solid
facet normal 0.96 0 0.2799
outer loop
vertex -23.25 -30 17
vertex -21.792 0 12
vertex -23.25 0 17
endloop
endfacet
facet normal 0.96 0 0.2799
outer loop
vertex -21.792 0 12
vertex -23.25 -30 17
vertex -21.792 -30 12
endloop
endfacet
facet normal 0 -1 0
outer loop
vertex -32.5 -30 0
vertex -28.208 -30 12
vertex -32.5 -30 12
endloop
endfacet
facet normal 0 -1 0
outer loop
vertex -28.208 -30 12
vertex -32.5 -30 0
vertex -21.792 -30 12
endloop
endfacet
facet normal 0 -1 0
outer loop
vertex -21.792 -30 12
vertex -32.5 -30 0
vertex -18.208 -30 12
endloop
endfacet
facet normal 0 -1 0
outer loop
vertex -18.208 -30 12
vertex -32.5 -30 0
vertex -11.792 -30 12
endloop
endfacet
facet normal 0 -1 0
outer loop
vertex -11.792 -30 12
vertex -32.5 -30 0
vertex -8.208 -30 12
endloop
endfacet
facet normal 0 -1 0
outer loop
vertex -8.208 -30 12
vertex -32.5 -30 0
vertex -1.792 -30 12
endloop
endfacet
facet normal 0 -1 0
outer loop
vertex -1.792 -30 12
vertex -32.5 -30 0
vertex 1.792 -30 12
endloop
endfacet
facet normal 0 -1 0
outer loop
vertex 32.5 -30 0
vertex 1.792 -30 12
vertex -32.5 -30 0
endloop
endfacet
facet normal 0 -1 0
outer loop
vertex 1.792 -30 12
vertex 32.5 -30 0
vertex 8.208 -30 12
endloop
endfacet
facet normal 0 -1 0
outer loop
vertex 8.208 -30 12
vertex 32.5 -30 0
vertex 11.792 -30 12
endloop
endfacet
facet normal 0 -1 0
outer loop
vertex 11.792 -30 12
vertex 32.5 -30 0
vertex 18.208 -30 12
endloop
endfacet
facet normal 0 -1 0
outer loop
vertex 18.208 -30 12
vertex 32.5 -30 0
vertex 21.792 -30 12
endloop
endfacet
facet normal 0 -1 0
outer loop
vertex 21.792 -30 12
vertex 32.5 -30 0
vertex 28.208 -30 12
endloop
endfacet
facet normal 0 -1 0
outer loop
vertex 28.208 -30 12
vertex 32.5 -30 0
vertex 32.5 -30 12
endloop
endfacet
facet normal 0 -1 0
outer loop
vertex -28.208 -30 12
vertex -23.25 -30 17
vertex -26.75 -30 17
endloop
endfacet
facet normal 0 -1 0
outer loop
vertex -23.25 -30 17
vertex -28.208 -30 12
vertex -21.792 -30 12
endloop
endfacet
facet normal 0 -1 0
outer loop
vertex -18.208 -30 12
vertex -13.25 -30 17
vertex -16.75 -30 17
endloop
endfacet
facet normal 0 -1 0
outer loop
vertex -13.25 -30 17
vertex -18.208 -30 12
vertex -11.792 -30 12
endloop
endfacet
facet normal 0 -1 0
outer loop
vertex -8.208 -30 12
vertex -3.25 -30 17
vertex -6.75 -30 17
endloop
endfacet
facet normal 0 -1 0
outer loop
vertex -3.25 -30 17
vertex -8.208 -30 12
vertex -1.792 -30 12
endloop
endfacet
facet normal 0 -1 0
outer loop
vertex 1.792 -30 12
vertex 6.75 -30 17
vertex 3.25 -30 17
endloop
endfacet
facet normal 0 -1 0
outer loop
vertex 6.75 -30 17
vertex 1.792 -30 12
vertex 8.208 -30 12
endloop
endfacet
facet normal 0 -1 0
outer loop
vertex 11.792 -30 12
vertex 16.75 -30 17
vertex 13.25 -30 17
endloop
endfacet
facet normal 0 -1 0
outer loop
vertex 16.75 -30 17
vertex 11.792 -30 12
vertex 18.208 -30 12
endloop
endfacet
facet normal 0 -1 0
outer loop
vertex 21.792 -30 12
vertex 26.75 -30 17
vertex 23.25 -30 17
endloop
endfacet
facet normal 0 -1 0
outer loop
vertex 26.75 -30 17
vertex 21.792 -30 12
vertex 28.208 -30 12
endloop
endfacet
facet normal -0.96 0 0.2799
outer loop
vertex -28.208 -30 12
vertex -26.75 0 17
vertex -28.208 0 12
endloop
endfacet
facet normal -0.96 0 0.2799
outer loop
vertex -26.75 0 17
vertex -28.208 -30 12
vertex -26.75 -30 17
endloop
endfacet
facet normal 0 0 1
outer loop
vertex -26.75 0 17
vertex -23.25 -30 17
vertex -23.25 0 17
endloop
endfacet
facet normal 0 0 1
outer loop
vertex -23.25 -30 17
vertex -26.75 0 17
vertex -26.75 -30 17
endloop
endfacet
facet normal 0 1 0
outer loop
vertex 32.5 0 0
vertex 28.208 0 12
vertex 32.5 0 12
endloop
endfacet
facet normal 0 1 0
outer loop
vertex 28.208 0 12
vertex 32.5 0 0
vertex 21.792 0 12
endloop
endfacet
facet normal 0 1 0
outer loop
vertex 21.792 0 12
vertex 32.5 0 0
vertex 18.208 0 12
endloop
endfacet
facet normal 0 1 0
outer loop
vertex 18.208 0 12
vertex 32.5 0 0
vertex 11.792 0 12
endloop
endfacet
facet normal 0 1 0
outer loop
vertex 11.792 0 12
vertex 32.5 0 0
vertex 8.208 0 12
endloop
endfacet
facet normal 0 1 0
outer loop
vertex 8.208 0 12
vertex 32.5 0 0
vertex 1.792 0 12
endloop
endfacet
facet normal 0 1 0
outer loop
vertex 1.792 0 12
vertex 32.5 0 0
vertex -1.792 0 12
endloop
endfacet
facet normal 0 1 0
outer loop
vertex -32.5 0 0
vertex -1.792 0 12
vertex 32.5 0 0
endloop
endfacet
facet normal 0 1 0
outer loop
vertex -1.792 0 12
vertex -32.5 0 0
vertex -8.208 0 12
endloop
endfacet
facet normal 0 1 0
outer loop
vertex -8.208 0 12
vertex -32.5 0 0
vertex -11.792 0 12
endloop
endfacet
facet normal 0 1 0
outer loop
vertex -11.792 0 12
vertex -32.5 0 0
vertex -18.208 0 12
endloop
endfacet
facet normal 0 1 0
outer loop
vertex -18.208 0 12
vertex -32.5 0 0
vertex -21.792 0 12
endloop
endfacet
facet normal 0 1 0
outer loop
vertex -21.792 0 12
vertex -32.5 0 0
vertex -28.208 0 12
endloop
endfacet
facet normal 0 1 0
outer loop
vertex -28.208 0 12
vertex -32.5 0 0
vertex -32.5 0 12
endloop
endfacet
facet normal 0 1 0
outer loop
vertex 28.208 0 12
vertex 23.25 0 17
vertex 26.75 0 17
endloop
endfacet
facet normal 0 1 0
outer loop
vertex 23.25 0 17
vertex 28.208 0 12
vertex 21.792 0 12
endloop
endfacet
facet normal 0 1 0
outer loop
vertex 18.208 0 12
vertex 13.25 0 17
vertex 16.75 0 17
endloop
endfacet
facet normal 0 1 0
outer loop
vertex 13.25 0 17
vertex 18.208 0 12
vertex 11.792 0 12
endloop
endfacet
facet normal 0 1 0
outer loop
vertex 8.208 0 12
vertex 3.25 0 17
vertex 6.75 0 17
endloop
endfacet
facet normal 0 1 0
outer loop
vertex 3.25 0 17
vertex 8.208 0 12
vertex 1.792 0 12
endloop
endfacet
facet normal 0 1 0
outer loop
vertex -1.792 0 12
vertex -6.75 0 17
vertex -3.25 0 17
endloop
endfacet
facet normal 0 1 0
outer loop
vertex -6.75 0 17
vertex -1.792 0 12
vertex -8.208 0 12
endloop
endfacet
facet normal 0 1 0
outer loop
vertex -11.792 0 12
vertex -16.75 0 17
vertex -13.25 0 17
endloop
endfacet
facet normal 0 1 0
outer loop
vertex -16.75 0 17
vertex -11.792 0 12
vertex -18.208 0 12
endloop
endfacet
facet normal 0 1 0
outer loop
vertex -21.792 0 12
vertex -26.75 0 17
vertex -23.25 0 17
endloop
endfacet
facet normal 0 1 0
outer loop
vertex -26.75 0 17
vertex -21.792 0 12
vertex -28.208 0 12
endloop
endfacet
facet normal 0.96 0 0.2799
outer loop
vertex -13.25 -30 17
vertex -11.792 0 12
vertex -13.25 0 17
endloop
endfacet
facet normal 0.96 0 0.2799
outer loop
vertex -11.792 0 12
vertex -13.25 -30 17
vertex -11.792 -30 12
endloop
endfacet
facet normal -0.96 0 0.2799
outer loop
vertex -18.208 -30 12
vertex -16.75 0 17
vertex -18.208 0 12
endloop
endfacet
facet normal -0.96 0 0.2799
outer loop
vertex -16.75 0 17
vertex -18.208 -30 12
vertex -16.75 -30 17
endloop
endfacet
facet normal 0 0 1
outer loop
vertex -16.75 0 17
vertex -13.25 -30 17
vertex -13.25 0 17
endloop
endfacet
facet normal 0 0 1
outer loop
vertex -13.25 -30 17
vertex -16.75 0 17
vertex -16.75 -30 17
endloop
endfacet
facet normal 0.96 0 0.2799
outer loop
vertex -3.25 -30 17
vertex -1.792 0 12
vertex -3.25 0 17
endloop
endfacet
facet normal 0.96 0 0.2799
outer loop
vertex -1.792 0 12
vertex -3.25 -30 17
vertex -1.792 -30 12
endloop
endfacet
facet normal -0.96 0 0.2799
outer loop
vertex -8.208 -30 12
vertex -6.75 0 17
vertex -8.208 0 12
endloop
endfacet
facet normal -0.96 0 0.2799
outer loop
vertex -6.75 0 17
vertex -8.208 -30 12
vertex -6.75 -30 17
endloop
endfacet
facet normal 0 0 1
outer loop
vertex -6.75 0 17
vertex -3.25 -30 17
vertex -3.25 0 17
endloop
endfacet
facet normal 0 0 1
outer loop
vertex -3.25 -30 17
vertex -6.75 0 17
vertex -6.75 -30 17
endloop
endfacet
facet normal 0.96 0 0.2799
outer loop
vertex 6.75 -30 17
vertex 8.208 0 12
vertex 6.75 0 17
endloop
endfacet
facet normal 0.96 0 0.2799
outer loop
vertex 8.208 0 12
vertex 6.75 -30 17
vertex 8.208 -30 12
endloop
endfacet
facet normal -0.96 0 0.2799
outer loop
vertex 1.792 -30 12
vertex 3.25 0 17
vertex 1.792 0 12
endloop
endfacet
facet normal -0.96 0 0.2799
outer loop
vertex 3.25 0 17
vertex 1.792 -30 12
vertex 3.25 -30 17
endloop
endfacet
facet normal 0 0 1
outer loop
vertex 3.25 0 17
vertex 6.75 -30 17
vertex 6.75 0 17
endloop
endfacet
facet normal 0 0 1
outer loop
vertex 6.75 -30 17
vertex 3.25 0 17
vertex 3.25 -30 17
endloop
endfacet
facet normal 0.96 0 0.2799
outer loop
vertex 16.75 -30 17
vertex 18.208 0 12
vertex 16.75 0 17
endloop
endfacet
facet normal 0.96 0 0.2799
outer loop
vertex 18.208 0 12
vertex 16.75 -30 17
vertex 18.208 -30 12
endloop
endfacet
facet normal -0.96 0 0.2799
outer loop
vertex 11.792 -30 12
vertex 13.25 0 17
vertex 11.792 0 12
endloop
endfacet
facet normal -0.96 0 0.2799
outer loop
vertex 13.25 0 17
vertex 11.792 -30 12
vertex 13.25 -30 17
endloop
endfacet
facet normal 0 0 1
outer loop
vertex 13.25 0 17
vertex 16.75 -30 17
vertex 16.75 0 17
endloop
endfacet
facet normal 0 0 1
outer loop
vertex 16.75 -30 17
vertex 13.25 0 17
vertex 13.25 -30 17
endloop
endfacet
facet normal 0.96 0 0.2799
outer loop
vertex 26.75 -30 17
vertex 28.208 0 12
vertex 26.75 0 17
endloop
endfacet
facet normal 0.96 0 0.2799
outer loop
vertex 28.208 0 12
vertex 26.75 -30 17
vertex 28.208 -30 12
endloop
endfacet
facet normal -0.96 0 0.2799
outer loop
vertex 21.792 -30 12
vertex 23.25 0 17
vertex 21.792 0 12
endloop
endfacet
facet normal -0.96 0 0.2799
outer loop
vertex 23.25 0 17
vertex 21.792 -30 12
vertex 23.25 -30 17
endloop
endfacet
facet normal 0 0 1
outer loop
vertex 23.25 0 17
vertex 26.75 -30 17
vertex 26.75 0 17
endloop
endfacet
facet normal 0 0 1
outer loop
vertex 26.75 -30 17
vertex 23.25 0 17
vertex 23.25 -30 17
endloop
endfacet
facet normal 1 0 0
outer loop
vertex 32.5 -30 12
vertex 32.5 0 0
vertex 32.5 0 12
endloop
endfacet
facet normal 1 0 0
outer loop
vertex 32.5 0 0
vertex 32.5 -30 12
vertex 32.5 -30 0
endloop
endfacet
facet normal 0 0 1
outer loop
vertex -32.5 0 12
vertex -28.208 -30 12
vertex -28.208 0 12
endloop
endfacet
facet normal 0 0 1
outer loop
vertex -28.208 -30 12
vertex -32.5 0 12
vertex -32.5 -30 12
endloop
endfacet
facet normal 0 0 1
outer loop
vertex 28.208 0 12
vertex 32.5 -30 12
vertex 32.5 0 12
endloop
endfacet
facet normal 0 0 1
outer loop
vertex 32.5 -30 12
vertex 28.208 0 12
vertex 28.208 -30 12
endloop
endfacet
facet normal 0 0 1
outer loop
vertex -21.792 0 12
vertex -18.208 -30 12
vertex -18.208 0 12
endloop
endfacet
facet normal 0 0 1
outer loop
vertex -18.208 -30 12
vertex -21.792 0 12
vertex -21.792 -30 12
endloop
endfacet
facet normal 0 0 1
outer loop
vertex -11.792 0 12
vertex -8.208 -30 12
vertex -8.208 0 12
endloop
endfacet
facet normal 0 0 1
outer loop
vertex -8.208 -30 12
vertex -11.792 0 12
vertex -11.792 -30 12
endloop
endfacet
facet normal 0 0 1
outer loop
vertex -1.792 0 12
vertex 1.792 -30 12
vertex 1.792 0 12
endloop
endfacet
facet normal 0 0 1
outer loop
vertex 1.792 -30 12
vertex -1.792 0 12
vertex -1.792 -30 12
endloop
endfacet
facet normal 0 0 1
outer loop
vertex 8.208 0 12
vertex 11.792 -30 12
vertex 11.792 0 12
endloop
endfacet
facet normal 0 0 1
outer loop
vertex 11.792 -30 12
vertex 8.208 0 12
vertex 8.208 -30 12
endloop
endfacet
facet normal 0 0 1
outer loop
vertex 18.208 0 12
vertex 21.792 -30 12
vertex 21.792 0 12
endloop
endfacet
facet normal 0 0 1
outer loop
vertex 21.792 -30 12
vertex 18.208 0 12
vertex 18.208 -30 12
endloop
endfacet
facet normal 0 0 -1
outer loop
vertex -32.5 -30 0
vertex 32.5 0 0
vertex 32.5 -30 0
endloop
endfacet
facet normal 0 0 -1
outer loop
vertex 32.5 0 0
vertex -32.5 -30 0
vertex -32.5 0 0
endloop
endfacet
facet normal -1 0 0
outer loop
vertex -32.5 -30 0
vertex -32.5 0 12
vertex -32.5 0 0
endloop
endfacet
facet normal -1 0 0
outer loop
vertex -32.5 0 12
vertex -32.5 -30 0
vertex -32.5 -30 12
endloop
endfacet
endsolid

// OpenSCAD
$fn = 32;

// ----------------------------------------------------------------------
// Toothed rack, 6 teeth
// 10 mm pitch, 5 mm teeth
// ----------------------------------------------------------------------

// --- parameters (mm) ---
bar_w = 30;     // bar width (Y)
bar_h = 12;     // bar height (Z)
teeth = 6;      // number of teeth
pitch = 10;     // tooth pitch
tooth_h = 5;    // tooth height above the bar
root_w = 7;     // tooth width at the root
crest_w = 3.5;  // tooth width at the crest

// --- derived feature positions (mm) ---
span = (teeth - 1) * pitch;  // = 50   distance between the outer teeth
bar_l = span + root_w + 8;   // = 65   bar length: teeth plus 4 mm at each end
tooth_x = -span / 2;         // = -25   X of the first tooth
height = bar_h + tooth_h;    // = 17   overall height
feature_centers = [
  [tooth_x + 0 * pitch, -bar_w / 2],
  [tooth_x + 1 * pitch, -bar_w / 2],
  [tooth_x + 2 * pitch, -bar_w / 2],
  [tooth_x + 3 * pitch, -bar_w / 2],
  [tooth_x + 4 * pitch, -bar_w / 2],
  [tooth_x + 5 * pitch, -bar_w / 2]
];   // tooth centre line, drives the tooth loop

// bar with a rack of teeth, one extruded trapezoium per centre
module rack_tooth() {
  linear_extrude(height = bar_w)
    polygon(points = [
      [0, 0],
      [root_w, 0],
      [root_w / 2 + crest_w / 2, tooth_h + 1],
      [root_w / 2 - crest_w / 2, tooth_h + 1]
    ]);
}

union() {
  translate([-bar_l / 2, -bar_w, 0]) cube([bar_l, bar_w, bar_h]);
  for (centre = feature_centers)
    translate([centre[0] - root_w / 2, 0, bar_h - 1]) rotate([90, 0, 0]) rack_tooth();
}
